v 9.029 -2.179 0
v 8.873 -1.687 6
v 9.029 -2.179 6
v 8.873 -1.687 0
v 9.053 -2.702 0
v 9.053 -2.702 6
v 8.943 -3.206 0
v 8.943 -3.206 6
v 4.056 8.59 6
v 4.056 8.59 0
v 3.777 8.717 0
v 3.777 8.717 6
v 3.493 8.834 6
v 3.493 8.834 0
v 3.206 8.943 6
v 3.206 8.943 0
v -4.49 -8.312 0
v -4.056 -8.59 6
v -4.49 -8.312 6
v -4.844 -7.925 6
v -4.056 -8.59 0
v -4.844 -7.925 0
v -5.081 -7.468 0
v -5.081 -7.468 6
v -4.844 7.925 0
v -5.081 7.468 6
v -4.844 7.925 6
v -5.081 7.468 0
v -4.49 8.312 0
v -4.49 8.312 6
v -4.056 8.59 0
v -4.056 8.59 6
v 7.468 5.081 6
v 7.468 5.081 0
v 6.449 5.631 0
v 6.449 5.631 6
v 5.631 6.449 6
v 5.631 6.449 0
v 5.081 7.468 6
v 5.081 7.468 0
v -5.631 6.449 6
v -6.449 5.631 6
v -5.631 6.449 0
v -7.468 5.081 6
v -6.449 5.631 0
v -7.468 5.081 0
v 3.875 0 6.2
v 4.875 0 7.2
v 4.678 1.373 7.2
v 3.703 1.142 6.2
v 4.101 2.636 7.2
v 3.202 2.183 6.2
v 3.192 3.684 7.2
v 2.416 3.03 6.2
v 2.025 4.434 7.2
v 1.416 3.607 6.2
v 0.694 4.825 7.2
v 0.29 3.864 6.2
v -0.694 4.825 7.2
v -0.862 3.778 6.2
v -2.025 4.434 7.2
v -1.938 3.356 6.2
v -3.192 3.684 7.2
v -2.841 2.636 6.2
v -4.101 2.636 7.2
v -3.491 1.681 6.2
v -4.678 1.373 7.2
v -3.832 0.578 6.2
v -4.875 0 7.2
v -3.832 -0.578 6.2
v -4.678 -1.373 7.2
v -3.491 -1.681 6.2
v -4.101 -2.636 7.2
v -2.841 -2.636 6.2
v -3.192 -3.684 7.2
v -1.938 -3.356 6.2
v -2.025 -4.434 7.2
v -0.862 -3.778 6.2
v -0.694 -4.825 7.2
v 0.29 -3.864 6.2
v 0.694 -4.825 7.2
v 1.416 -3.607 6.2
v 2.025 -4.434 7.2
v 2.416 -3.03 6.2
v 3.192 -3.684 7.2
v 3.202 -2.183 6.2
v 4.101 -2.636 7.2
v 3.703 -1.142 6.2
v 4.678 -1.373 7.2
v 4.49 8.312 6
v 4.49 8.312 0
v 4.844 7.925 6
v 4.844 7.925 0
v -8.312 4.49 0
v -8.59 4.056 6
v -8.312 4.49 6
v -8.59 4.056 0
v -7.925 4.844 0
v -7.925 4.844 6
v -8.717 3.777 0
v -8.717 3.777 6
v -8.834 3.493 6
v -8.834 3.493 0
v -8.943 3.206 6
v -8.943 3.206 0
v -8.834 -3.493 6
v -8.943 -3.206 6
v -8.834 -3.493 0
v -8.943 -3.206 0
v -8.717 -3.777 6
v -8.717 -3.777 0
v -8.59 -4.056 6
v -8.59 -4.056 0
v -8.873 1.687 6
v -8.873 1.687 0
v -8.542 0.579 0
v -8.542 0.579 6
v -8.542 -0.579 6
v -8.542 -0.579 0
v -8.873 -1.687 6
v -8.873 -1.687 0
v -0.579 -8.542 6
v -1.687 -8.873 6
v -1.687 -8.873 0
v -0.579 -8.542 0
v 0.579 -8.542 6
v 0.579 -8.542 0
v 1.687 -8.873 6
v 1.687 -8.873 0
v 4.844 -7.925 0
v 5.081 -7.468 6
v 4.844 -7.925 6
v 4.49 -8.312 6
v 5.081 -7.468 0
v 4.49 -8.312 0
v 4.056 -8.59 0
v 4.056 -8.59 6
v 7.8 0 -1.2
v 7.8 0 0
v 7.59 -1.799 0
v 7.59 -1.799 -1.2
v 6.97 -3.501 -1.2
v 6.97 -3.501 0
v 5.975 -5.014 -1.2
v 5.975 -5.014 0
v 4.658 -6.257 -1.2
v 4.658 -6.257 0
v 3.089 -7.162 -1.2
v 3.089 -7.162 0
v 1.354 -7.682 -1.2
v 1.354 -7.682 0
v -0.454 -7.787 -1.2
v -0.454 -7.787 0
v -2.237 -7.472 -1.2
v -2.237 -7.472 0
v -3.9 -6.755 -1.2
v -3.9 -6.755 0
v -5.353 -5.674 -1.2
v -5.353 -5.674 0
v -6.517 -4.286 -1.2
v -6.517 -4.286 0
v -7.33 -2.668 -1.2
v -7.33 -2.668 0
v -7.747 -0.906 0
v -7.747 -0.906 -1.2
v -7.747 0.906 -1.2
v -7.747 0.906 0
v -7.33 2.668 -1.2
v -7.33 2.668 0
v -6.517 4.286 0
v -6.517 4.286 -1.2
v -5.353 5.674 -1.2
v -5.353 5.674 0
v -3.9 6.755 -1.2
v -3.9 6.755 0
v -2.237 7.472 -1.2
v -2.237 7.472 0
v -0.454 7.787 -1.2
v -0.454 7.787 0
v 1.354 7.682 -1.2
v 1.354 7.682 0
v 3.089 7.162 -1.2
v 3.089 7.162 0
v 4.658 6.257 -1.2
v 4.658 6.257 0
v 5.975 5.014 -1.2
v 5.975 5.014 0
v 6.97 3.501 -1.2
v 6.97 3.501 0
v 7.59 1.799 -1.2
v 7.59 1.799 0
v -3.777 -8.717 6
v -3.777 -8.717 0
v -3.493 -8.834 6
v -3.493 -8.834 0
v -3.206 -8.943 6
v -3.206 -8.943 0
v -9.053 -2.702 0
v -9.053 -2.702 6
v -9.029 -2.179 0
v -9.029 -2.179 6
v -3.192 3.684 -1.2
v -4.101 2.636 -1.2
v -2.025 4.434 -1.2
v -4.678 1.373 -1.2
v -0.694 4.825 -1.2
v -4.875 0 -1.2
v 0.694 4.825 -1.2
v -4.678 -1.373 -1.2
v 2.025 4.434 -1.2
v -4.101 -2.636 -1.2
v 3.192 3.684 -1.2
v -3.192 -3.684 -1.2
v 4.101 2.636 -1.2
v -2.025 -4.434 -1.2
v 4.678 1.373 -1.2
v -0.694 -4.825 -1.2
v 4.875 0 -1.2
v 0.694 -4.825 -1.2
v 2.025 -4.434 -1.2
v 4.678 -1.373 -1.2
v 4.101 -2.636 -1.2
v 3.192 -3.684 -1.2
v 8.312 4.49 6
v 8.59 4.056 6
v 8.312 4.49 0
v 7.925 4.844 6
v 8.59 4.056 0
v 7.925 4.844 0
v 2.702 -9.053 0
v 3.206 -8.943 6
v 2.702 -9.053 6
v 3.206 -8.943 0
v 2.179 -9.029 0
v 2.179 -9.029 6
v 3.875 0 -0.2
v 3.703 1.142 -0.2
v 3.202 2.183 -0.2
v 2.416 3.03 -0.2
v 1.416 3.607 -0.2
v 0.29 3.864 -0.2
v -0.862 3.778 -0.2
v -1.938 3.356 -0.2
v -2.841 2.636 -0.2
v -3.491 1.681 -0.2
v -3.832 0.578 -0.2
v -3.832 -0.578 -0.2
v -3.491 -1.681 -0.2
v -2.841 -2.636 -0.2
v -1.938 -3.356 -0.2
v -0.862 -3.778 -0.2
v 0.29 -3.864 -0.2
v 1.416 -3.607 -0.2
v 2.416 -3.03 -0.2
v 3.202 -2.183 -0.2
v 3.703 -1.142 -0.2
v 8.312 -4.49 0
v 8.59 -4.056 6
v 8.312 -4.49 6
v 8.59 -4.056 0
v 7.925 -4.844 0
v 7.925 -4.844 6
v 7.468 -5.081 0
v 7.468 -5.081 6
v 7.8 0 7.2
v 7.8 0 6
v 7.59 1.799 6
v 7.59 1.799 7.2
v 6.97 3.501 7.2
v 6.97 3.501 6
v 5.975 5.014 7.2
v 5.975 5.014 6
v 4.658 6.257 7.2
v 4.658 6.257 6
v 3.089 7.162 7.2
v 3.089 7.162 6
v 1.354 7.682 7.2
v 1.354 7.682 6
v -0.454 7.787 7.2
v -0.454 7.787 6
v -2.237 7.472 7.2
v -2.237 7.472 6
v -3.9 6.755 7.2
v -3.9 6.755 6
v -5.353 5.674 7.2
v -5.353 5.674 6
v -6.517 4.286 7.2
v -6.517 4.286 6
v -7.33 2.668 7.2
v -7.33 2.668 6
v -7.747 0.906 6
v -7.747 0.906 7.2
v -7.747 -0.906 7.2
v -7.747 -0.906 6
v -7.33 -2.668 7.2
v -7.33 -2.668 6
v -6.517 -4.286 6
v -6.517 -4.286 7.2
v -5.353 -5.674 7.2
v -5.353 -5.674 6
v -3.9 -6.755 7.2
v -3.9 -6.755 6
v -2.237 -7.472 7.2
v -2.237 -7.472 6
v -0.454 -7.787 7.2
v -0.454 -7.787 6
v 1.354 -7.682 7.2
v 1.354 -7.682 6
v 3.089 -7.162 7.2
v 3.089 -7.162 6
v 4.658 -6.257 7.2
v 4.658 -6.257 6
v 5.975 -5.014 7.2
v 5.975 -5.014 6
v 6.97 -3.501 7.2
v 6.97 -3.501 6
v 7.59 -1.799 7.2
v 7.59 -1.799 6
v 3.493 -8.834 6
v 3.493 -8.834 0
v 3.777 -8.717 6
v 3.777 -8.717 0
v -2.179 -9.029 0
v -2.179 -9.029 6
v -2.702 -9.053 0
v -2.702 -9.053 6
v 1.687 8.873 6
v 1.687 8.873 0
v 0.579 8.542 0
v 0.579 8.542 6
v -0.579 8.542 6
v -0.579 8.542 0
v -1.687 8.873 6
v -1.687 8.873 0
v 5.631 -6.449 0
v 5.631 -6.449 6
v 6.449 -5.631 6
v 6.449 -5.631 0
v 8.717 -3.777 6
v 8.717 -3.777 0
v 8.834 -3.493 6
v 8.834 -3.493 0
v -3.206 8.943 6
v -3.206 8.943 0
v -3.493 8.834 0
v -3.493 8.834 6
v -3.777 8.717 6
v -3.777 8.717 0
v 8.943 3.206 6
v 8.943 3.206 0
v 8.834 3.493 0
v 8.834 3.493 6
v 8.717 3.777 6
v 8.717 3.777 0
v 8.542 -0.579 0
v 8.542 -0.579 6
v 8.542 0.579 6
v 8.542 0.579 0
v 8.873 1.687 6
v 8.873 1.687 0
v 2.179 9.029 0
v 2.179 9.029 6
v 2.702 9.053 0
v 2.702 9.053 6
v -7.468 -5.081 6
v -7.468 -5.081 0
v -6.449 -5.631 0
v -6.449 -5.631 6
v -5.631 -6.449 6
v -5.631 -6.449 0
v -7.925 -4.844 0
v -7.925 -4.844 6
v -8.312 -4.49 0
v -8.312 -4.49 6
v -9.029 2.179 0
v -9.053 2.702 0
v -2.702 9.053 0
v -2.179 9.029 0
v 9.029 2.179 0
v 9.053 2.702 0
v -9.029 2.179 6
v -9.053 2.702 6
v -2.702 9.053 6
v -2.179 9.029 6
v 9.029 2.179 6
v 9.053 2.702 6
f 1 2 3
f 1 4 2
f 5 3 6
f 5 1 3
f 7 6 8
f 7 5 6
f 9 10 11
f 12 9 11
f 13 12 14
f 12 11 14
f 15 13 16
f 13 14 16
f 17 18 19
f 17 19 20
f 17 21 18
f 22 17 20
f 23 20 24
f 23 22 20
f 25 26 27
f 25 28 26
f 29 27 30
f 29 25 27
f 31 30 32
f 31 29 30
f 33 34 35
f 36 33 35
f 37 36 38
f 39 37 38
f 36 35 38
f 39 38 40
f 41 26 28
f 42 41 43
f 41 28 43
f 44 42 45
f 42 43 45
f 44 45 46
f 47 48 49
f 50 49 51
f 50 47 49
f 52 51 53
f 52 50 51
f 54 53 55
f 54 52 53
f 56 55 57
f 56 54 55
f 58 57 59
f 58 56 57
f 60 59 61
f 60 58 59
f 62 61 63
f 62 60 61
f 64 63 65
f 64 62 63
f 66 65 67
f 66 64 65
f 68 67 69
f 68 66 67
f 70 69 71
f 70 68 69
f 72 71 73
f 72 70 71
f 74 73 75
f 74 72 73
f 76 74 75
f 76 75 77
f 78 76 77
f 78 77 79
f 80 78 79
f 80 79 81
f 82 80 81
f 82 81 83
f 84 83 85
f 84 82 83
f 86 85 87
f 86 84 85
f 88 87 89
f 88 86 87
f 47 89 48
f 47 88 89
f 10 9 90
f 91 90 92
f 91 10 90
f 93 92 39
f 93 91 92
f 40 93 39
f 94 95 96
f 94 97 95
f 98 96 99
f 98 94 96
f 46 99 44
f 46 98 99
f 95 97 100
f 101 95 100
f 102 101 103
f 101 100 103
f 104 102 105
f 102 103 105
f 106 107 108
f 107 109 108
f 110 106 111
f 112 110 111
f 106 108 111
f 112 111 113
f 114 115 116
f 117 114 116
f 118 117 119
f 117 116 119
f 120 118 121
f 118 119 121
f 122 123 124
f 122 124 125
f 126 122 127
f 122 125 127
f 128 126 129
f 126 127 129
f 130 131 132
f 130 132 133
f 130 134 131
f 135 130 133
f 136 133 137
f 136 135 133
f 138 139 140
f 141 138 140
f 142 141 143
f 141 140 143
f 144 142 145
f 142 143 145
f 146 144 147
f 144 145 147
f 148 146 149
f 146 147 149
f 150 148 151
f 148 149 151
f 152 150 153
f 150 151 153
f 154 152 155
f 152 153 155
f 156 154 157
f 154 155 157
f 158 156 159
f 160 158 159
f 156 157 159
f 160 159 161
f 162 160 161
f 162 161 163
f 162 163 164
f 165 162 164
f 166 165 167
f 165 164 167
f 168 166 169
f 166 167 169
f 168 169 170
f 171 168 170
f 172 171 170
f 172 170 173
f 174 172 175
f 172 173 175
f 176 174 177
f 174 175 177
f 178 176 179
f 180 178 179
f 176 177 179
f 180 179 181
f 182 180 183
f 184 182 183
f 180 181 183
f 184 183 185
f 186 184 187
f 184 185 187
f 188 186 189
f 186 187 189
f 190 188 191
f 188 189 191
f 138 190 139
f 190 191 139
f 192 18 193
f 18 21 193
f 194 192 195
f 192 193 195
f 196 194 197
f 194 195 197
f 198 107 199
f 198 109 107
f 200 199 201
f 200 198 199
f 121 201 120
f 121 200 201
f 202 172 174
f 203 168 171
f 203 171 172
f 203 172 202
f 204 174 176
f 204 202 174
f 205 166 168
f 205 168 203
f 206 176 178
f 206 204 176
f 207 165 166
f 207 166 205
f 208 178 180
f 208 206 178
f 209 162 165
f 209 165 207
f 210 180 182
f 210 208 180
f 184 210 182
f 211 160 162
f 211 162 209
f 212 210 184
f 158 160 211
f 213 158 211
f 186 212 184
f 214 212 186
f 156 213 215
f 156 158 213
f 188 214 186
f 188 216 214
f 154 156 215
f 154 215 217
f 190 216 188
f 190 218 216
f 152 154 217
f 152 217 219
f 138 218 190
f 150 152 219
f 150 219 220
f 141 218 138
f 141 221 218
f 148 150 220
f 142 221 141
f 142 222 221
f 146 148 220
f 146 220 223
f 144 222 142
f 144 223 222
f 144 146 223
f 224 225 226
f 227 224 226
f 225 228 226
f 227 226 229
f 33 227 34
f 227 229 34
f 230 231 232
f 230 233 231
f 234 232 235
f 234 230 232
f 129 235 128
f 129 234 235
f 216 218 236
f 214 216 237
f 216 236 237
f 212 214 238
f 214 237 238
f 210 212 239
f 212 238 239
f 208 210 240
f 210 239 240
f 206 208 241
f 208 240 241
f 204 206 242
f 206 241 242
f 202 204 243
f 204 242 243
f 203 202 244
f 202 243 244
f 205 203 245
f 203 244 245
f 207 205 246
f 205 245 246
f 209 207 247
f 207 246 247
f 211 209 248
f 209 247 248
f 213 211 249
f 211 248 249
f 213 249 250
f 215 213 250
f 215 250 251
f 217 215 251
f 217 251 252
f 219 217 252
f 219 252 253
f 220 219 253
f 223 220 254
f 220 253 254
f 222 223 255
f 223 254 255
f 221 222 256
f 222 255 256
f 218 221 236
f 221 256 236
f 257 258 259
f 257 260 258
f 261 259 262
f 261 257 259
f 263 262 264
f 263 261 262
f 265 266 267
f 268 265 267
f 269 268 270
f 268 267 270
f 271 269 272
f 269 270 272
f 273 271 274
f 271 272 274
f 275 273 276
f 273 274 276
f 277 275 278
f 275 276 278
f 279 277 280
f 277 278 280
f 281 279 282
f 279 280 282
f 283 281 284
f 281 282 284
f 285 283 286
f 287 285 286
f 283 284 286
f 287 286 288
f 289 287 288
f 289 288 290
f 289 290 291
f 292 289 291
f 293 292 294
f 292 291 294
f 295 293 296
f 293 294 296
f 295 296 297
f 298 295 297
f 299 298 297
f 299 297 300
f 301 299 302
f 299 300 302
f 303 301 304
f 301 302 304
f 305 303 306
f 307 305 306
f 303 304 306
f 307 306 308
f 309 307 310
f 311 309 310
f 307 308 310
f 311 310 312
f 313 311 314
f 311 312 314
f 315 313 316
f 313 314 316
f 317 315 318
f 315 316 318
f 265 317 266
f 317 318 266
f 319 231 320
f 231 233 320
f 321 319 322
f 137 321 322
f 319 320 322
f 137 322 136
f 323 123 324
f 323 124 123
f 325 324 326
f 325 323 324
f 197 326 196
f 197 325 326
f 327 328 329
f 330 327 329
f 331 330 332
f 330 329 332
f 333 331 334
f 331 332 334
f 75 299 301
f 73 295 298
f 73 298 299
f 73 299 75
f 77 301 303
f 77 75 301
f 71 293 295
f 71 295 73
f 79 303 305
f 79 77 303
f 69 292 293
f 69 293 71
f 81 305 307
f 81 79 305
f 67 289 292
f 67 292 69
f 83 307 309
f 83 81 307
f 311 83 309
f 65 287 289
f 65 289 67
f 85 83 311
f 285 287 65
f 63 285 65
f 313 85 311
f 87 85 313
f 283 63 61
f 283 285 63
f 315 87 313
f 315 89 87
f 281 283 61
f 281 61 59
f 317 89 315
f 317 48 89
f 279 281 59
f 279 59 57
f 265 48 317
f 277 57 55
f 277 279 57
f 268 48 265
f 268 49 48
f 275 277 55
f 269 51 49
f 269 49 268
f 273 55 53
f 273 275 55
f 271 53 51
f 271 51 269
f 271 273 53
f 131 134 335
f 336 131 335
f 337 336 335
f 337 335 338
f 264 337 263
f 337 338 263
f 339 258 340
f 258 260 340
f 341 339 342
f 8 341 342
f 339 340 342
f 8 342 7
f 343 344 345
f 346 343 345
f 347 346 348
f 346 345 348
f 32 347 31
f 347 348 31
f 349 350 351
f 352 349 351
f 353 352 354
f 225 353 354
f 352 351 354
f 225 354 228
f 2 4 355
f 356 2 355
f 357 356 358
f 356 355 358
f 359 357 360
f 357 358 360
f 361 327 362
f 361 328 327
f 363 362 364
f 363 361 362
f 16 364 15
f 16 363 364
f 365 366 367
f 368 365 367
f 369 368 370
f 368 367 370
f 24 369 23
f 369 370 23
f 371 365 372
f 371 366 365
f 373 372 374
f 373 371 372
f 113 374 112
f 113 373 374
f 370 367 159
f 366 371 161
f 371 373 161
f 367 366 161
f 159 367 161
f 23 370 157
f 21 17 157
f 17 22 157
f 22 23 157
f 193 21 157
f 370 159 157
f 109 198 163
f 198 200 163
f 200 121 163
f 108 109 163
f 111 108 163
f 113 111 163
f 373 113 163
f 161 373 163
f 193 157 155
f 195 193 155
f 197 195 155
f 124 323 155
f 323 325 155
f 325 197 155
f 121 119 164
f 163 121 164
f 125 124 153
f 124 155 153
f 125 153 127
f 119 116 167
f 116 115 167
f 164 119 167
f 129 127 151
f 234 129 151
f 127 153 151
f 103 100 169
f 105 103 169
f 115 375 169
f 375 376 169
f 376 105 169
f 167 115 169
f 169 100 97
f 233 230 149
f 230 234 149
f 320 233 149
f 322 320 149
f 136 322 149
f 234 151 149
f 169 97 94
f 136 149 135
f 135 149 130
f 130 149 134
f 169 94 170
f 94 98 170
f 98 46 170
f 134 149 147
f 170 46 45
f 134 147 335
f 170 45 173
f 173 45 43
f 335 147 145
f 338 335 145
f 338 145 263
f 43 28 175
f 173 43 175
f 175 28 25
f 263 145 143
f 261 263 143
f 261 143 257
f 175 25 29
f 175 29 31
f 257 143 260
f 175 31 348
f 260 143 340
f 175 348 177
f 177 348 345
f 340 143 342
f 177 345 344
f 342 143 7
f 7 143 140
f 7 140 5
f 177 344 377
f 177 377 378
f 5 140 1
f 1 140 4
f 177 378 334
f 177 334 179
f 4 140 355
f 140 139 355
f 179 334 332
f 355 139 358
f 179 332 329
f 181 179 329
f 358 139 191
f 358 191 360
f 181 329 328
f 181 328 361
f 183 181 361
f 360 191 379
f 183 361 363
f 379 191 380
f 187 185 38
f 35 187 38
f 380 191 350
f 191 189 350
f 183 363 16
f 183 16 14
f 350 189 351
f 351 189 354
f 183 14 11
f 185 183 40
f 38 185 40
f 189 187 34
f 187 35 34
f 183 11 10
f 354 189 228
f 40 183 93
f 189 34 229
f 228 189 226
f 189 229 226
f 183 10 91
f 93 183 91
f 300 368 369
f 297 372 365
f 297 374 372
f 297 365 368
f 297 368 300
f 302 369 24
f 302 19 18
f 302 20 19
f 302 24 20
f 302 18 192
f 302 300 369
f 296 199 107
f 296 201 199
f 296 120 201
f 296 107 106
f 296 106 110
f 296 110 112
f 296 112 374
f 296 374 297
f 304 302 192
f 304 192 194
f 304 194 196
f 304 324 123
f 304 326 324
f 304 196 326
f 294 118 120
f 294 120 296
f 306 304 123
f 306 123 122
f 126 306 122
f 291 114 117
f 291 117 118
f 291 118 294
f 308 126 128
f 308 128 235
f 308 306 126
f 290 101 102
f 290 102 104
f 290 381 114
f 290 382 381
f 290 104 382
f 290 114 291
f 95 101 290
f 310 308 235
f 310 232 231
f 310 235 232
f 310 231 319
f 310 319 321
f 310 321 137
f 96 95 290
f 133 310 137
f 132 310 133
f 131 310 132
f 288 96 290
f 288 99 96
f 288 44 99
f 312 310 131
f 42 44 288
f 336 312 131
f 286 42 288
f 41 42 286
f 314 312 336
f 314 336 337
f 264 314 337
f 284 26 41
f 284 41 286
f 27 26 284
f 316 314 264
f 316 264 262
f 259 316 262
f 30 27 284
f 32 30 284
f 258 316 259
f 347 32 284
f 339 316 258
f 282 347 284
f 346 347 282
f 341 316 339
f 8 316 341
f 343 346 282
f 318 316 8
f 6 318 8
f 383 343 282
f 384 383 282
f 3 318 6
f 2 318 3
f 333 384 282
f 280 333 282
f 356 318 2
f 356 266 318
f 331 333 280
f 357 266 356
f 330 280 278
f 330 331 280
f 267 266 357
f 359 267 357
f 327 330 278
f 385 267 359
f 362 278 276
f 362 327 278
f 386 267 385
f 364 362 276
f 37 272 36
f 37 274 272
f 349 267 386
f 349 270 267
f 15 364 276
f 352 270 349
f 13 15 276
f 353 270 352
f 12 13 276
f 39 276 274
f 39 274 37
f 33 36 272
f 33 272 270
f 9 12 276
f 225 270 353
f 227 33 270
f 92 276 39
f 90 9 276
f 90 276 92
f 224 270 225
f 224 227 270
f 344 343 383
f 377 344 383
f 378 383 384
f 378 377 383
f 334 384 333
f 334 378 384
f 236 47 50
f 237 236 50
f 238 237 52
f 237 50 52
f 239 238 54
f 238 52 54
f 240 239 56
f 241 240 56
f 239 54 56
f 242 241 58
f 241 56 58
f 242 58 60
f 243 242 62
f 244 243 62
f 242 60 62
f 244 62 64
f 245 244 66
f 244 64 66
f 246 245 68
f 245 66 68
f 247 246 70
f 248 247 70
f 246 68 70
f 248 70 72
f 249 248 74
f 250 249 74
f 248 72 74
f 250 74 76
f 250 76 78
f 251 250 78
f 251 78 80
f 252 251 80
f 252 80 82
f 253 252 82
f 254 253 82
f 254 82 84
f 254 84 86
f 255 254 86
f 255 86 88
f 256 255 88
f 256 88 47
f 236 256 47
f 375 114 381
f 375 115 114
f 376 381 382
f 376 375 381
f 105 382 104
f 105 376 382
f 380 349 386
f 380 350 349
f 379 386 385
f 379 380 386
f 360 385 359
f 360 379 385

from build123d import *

# Parameters (mm, degrees)
F0_R      = 9.5
F1_DEPTH  = 6
F2_R      = 7.8
F3_DEPTH  = 1.2
F4_R      = 7.8
F5_DEPTH  = 1.2
F6_R      = 4
F7_DEPTH  = 6
F8_R      = 2
F9_R      = 3.875
F10_DEPTH = 8.401
F11_SIZE  = 1


# Not quite as in the source:
# - the program builds the solid bodies; features that only make, move or delete a surface that nothing else refers to are left out


with BuildPart() as f1:
    # F0 (on Top) → F1 (new body)
    with BuildSketch(Plane.XY):
        Circle(F0_R)
    extrude(amount=F1_DEPTH)

    # F2 (on face) → F3 (join)
    with BuildSketch(Plane.XY.offset(6)):
        Circle(F2_R)
    extrude(amount=F3_DEPTH)

    # F4 (on face) → F5 (join)
    with BuildSketch(Plane(origin=(0, 0, 0), x_dir=(1, 0, 0), z_dir=(0, 0, -1))):
        Circle(F4_R)
    extrude(amount=F5_DEPTH)

    # F6 (on face) → F7 (cut, through all)
    with BuildSketch(Plane(origin=(0, 0, 0), x_dir=(1, 0, 0), z_dir=(0, 0, -1))):
        with Locations((0, 12.5)):
            Circle(F6_R)
        with Locations((-8.8388347648, 8.8388347648)):
            Circle(F6_R)
        with Locations((-12.5, 0)):
            Circle(F6_R)
        with Locations((-8.8388347648, -8.8388347648)):
            Circle(F6_R)
        with Locations((0, -12.5)):
            Circle(F6_R)
        with Locations((8.8388347648, -8.8388347648)):
            Circle(F6_R)
        with Locations((12.5, 0)):
            Circle(F6_R)
        with Locations((8.8388347648, 8.8388347648)):
            Circle(F6_R)
    extrude(amount=-F7_DEPTH, mode=Mode.SUBTRACT)

    # F8
    f8_edges = [f1.edges().sort_by_distance(p)[0] for p in [
        (-9.22, -2.289454, 3),
        (-9.22, 2.289454, 3),
        (-4.900636, -8.138413, 3),
        (-8.138413, -4.900636, 3),
        (-8.138413, 4.900636, 3),
        (-4.900636, 8.138413, 3),
        (-2.289454, 9.22, 3),
        (2.289454, 9.22, 3),
        (8.138413, 4.900636, 3),
        (4.900636, 8.138413, 3),
        (9.22, 2.289454, 3),
        (9.22, -2.289454, 3),
        (8.138413, -4.900636, 3),
        (4.900636, -8.138413, 3),
        (2.289454, -9.22, 3),
        (-2.289454, -9.22, 3),
    ]]
    fillet(f8_edges, radius=F8_R)

    # F9 (on face) → F10 (cut, through all)
    with BuildSketch(Plane.XY.offset(7.2)):
        Circle(F9_R)
    extrude(amount=-F10_DEPTH, mode=Mode.SUBTRACT)

    # F11
    f11_edges = [f1.edges().sort_by_distance(p)[0] for p in [
        (-3.875, 0, 7.2),
        (-3.875, 0, -1.2),
    ]]
    chamfer(f11_edges, length=F11_SIZE)


solid = f1.part
